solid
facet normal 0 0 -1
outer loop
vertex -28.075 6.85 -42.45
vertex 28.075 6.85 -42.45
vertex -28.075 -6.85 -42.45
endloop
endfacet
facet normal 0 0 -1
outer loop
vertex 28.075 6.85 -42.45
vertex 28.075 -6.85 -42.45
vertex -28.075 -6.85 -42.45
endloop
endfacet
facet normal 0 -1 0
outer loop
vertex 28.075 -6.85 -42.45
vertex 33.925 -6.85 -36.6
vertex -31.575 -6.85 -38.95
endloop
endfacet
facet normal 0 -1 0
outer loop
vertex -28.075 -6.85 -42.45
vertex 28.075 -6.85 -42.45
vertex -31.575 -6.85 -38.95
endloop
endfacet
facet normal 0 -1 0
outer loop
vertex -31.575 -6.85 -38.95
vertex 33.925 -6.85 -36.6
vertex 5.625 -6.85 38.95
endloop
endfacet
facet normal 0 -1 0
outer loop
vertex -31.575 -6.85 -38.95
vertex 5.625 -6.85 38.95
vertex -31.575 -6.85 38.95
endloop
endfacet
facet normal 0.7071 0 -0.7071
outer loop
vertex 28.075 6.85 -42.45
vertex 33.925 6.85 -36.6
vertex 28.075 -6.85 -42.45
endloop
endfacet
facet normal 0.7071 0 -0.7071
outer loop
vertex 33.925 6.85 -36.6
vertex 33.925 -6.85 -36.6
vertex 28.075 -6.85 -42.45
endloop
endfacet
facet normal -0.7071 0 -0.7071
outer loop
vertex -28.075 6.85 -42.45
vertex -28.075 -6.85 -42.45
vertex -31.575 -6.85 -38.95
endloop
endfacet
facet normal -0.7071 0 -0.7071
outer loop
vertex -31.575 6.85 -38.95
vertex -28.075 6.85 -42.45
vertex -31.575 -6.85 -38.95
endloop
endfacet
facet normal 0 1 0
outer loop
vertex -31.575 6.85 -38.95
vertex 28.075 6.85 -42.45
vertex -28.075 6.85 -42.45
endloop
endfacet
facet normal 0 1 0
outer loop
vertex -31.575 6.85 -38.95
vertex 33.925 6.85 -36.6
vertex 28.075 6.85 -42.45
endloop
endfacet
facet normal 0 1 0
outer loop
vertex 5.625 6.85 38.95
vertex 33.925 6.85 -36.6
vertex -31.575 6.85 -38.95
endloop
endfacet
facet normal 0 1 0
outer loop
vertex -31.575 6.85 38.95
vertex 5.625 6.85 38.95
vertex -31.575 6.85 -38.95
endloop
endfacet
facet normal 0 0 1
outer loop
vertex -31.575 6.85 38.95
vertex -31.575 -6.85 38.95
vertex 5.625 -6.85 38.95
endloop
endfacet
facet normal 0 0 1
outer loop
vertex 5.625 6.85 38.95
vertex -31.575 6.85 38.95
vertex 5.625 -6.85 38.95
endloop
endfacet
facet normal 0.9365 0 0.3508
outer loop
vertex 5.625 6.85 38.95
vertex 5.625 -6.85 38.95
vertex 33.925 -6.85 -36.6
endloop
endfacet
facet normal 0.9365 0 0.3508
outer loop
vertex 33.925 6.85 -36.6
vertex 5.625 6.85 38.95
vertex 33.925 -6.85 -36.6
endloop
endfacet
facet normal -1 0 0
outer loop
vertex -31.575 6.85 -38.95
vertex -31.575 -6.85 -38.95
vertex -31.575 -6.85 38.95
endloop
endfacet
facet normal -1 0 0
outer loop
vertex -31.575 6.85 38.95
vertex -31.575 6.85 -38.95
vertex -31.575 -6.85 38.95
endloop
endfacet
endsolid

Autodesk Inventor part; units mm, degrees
ref_plane "YZ Plane" through (0, 0, 0) normal (1, 0, 0) x (0, 1, 0)
ref_plane "XZ Plane" through (0, 0, 0) normal (0, 1, 0) x (-1, 0, 0)
ref_plane "XY Plane" through (0, 0, 0) normal (0, 0, 1) x (1, 0, 0)
sketch "Sketch1" plane through (0, 0, 0) normal (0, 1, 0) x (-1, 0, 0)
  line L0 (31.575, 38.95) -> (-5.625, 38.95)
  line L1 (-5.625, 38.95) -> (-33.925, -36.6)
  line L2 (-33.925, -36.6) -> (-28.075, -42.45)
  line L3 (-28.075, -42.45) -> (28.075, -42.45)
  line L4 (28.075, -42.45) -> (31.575, -38.95)
  line L5 (31.575, -38.95) -> (31.575, 38.95)
  point P0 (0, 0)
  point P1 (0, -42.45)
  point P2 (31.575, 0)
  dimension "d0" = 3.5
  dimension "d1" = 3.5
  dimension "d2" = 81.4
  dimension "d3" = 37.2
  dimension "d4" = 65.5
  dimension "d5" = 59.65
extrude "Extrusion1" add sketch "Sketch1" along normal mid plane 13.7
equation "\"d1\" = d0"
properties part number "StrategyCard_All" material "Paper"
